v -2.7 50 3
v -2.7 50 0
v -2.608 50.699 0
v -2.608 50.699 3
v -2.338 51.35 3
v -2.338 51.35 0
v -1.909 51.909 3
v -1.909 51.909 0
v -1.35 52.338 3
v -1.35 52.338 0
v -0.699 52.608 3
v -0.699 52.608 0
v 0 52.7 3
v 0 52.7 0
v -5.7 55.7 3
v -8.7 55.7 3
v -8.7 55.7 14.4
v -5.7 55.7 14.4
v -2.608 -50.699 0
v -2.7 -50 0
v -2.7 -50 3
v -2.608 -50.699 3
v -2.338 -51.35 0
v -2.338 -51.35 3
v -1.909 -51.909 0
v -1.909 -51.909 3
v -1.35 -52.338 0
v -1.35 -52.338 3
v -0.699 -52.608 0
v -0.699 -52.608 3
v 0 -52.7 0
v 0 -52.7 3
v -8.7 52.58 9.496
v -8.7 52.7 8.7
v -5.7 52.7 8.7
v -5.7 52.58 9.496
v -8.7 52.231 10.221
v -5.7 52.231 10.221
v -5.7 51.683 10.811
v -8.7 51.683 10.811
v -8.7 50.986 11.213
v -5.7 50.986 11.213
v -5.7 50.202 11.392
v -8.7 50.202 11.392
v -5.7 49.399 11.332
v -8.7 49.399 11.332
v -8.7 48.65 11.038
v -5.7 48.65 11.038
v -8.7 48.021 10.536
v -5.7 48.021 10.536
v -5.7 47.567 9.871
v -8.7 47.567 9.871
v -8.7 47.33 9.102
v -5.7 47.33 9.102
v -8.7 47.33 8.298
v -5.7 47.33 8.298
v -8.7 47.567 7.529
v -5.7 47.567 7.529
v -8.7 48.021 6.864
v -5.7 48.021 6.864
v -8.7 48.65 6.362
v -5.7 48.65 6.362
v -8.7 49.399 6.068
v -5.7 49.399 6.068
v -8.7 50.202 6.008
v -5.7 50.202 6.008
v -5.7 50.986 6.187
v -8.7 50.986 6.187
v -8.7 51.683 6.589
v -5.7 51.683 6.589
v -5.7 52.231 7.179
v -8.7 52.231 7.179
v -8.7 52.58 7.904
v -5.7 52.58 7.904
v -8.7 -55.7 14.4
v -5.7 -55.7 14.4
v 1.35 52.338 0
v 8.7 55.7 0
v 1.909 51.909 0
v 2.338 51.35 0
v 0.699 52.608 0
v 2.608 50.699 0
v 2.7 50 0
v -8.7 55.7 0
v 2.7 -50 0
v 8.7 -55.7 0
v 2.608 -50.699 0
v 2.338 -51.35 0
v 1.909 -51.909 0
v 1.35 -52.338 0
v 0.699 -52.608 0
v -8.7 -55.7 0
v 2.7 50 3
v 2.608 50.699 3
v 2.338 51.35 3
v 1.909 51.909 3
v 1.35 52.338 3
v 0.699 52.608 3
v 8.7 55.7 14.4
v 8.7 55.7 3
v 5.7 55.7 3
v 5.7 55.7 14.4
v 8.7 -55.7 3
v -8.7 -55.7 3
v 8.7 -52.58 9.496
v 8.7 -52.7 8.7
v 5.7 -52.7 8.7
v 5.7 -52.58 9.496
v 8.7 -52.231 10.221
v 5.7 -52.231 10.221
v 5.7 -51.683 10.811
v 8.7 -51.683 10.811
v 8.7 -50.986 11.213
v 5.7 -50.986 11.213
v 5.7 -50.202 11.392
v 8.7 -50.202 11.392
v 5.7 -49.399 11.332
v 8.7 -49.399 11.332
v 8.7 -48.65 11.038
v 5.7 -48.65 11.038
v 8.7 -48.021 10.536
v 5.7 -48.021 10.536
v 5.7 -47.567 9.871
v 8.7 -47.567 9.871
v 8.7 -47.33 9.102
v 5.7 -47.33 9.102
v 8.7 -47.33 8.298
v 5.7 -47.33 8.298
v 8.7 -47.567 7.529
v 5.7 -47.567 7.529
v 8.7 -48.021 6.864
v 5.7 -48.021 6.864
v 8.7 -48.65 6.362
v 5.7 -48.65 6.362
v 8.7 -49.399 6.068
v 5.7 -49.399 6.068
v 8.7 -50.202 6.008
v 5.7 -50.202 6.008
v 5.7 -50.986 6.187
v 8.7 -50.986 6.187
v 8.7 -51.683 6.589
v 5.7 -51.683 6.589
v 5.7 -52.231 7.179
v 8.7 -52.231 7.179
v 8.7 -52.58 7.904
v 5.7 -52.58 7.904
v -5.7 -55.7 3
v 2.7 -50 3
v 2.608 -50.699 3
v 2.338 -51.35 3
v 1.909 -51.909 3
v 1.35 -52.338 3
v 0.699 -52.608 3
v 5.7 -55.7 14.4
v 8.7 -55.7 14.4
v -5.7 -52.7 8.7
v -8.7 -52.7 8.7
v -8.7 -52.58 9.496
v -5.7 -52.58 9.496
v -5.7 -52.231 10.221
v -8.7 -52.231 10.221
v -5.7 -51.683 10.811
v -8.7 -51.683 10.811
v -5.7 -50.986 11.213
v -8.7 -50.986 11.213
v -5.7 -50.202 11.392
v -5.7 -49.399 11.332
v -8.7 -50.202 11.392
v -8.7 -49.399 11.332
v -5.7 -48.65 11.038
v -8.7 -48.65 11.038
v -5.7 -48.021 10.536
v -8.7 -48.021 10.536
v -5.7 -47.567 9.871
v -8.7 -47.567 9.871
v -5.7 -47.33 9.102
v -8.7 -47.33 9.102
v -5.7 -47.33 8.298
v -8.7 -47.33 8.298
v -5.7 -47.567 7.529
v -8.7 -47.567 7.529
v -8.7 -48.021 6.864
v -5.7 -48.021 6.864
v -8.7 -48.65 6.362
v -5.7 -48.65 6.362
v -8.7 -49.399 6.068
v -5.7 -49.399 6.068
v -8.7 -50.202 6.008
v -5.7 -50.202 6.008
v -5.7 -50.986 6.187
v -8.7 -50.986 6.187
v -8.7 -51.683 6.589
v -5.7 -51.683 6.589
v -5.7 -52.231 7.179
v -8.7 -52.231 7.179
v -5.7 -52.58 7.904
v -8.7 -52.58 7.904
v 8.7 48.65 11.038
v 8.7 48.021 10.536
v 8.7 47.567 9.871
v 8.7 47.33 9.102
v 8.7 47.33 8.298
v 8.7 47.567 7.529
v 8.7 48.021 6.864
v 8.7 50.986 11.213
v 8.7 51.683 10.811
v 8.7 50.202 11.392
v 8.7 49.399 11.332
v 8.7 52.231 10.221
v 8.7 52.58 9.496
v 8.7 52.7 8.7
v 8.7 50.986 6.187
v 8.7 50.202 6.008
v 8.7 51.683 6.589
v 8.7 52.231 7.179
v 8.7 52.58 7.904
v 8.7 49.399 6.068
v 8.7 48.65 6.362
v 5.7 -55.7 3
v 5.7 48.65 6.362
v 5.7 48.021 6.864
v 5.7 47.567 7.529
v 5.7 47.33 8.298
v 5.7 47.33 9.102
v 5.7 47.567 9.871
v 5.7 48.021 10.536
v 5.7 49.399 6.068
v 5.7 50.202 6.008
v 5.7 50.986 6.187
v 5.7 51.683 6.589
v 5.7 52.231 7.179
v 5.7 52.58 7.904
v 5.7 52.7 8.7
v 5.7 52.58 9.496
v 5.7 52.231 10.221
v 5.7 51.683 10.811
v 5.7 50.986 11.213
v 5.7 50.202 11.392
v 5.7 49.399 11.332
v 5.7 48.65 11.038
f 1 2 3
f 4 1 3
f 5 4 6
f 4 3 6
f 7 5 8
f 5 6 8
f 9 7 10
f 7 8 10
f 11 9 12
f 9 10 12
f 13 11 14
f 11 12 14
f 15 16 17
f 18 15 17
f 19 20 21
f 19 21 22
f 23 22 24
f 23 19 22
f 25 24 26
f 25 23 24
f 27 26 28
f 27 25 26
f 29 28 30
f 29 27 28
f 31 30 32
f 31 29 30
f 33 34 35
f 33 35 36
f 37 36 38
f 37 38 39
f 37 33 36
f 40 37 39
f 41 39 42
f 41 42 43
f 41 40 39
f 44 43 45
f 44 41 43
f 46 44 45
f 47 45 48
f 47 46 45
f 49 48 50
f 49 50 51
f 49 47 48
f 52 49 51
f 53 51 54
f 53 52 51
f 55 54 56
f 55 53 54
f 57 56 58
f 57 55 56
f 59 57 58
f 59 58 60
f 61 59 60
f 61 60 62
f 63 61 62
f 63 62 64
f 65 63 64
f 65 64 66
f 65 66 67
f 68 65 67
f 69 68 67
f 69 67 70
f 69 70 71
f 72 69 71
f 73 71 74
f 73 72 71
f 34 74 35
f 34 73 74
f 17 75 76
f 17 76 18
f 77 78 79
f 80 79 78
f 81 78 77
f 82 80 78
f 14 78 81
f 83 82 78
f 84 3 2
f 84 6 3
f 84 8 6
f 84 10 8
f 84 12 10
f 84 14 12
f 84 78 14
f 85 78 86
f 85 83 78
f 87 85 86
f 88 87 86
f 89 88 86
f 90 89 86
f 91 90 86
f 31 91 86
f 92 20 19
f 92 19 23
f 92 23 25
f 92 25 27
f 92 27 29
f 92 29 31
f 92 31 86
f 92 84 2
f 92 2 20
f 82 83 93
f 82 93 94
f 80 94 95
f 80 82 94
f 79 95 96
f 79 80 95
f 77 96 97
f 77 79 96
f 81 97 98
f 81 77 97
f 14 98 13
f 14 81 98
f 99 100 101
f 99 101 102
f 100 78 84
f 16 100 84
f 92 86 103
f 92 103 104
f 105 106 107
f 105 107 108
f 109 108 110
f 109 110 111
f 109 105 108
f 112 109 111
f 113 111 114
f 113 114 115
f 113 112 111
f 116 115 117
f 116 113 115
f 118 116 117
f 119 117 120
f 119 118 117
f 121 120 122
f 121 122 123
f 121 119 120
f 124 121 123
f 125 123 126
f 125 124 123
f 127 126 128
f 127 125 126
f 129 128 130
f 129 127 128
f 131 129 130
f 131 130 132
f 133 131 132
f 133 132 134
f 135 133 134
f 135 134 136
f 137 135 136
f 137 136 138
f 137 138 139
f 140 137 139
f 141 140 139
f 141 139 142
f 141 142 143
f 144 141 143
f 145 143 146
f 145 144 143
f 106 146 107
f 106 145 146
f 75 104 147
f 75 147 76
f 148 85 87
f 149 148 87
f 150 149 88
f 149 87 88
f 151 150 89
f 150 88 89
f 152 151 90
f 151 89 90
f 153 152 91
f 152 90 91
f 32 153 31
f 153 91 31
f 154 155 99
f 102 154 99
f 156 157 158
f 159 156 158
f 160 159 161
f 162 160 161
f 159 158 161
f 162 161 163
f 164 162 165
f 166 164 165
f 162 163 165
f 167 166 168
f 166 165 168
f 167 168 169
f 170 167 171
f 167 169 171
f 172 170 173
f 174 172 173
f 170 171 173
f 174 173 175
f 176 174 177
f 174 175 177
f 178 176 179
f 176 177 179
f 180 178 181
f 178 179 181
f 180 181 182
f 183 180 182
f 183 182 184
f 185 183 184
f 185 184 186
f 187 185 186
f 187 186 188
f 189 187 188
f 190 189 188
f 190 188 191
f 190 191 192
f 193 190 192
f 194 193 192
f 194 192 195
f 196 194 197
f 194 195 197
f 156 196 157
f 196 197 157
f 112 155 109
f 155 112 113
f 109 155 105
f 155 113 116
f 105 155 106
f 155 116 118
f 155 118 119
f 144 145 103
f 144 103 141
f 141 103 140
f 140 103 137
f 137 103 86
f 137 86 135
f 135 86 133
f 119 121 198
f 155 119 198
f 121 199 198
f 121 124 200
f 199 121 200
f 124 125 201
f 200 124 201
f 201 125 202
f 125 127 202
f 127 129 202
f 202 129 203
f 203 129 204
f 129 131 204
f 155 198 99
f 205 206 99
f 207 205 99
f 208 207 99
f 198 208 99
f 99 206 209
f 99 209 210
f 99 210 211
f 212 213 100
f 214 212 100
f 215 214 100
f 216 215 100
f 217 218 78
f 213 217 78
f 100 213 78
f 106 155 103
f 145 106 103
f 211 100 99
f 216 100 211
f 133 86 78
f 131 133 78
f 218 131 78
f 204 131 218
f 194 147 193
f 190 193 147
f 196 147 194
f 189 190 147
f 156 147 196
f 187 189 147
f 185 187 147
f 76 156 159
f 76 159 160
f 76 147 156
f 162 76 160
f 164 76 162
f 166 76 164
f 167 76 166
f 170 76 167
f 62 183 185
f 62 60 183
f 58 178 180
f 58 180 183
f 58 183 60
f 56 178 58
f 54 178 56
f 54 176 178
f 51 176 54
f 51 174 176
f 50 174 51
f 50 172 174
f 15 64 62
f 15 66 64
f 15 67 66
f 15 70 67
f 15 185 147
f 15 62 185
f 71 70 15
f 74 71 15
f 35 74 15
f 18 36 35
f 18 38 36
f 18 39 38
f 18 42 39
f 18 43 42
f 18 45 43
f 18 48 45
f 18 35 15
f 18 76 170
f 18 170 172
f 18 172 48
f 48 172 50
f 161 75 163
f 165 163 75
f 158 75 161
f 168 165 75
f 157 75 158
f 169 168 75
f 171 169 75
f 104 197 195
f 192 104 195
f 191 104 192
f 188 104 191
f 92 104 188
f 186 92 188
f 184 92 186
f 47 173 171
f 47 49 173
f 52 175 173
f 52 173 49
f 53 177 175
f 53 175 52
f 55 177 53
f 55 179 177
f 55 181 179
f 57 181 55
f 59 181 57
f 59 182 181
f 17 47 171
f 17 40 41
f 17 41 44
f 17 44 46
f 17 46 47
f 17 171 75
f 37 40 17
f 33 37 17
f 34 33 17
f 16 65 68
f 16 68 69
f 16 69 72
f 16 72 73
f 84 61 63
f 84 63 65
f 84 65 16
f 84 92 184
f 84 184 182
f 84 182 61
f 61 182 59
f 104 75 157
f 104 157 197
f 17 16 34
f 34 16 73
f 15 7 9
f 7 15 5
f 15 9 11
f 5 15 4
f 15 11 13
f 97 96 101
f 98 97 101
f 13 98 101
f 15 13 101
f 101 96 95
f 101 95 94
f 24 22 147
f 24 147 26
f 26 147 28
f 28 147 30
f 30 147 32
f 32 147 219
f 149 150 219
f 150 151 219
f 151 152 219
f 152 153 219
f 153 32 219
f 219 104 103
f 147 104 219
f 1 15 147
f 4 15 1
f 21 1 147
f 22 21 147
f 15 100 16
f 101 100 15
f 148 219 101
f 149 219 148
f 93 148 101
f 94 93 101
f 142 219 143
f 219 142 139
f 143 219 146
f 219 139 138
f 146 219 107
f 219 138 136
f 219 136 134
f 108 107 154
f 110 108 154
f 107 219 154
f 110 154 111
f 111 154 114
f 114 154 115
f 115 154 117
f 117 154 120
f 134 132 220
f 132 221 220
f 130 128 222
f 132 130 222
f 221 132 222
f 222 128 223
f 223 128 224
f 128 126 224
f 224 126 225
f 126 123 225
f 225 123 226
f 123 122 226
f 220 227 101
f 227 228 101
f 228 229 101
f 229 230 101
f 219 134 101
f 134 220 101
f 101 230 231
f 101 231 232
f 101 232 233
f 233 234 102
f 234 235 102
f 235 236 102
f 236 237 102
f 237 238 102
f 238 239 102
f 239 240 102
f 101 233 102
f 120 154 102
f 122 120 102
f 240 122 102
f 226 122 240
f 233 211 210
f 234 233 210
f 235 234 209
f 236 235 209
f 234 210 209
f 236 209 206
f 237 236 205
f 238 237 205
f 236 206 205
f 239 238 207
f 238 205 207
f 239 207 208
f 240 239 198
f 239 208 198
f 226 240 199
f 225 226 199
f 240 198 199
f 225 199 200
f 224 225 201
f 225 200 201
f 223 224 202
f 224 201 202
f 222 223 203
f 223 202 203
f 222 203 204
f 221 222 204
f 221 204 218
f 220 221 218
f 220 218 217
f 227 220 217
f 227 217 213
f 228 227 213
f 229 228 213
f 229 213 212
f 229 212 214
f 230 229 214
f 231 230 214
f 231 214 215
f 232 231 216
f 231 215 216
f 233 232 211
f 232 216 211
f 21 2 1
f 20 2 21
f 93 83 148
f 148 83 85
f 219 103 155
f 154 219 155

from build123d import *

# Parameters (mm, degrees)
PAD_DEPTH               = 3
SKETCH001_W             = 55.7
SKETCH001_H             = 14.4
SKETCH001_R             = 2.7
PAD001_DEPTH            = 3
PAD_MIRRORED_2_DEPTH    = 3
SKETCH001_MIRRORED_2_W  = 55.7
SKETCH001_MIRRORED_2_H  = 14.4
SKETCH001_MIRRORED_2_R  = 2.7
PAD001_MIRRORED_2_DEPTH = 3


with BuildPart() as part:
    # Sketch → Pad (new body)
    with BuildSketch(Plane.XY):
        with BuildLine():
            ThreePointArc((2.7, 50), (1.909196, 51.909202), (0, 52.700021))
            Line((0, 52.700021), (0, 55.700021))
            Line((0, 55.700021), (8.7, 55.700021))
            Line((8.7, 55.700021), (8.7, 0))
            Line((8.7, 0), (2.7, 0))
            Line((2.7, 0), (2.7, 50))
        make_face()
    pad = extrude(amount=PAD_DEPTH)

    # Sketch001 → Pad001 (join)
    with BuildSketch(Plane.YZ.offset(8.7)):
        with Locations((27.85, 7.2)):
            Rectangle(SKETCH001_W, SKETCH001_H)
        with Locations((50, 8.7)):
            Circle(SKETCH001_R, mode=Mode.SUBTRACT)
    pad001 = extrude(amount=-PAD001_DEPTH)

    # Sketch Mirrored 2 → Pad Mirrored 2 (add)
    with BuildSketch(Plane(origin=(0, 0, 0), x_dir=(-1, 0, 0), z_dir=(0, 0, -1))):
        with BuildLine():
            ThreePointArc((2.7, 50), (1.909196, 51.909202), (0, 52.700021))
            Line((0, 52.700021), (0, 55.700021))
            Line((0, 55.700021), (8.7, 55.700021))
            Line((8.7, 55.700021), (8.7, 0))
            Line((8.7, 0), (2.7, 0))
            Line((2.7, 0), (2.7, 50))
        make_face()
    pad_mirrored_2 = extrude(amount=-PAD_MIRRORED_2_DEPTH)

    # Sketch001 Mirrored 2 → Pad001 Mirrored 2 (add)
    with BuildSketch(Plane.YZ.offset(-8.7)):
        with Locations((27.85, 7.2)):
            Rectangle(SKETCH001_MIRRORED_2_W, SKETCH001_MIRRORED_2_H)
        with Locations((50, 8.7)):
            Circle(SKETCH001_MIRRORED_2_R, mode=Mode.SUBTRACT)
    pad001_mirrored_2 = extrude(amount=PAD001_MIRRORED_2_DEPTH)

    # Mirrored001: Pad, Pad001, Pad Mirrored 2, Pad001 Mirrored 2 across Sketch H_Axis
    add(pad.mirror(Plane.ZX))
    add(pad001.mirror(Plane.ZX))
    add(pad_mirrored_2.mirror(Plane.ZX))
    add(pad001_mirrored_2.mirror(Plane.ZX))


solid = part.part
